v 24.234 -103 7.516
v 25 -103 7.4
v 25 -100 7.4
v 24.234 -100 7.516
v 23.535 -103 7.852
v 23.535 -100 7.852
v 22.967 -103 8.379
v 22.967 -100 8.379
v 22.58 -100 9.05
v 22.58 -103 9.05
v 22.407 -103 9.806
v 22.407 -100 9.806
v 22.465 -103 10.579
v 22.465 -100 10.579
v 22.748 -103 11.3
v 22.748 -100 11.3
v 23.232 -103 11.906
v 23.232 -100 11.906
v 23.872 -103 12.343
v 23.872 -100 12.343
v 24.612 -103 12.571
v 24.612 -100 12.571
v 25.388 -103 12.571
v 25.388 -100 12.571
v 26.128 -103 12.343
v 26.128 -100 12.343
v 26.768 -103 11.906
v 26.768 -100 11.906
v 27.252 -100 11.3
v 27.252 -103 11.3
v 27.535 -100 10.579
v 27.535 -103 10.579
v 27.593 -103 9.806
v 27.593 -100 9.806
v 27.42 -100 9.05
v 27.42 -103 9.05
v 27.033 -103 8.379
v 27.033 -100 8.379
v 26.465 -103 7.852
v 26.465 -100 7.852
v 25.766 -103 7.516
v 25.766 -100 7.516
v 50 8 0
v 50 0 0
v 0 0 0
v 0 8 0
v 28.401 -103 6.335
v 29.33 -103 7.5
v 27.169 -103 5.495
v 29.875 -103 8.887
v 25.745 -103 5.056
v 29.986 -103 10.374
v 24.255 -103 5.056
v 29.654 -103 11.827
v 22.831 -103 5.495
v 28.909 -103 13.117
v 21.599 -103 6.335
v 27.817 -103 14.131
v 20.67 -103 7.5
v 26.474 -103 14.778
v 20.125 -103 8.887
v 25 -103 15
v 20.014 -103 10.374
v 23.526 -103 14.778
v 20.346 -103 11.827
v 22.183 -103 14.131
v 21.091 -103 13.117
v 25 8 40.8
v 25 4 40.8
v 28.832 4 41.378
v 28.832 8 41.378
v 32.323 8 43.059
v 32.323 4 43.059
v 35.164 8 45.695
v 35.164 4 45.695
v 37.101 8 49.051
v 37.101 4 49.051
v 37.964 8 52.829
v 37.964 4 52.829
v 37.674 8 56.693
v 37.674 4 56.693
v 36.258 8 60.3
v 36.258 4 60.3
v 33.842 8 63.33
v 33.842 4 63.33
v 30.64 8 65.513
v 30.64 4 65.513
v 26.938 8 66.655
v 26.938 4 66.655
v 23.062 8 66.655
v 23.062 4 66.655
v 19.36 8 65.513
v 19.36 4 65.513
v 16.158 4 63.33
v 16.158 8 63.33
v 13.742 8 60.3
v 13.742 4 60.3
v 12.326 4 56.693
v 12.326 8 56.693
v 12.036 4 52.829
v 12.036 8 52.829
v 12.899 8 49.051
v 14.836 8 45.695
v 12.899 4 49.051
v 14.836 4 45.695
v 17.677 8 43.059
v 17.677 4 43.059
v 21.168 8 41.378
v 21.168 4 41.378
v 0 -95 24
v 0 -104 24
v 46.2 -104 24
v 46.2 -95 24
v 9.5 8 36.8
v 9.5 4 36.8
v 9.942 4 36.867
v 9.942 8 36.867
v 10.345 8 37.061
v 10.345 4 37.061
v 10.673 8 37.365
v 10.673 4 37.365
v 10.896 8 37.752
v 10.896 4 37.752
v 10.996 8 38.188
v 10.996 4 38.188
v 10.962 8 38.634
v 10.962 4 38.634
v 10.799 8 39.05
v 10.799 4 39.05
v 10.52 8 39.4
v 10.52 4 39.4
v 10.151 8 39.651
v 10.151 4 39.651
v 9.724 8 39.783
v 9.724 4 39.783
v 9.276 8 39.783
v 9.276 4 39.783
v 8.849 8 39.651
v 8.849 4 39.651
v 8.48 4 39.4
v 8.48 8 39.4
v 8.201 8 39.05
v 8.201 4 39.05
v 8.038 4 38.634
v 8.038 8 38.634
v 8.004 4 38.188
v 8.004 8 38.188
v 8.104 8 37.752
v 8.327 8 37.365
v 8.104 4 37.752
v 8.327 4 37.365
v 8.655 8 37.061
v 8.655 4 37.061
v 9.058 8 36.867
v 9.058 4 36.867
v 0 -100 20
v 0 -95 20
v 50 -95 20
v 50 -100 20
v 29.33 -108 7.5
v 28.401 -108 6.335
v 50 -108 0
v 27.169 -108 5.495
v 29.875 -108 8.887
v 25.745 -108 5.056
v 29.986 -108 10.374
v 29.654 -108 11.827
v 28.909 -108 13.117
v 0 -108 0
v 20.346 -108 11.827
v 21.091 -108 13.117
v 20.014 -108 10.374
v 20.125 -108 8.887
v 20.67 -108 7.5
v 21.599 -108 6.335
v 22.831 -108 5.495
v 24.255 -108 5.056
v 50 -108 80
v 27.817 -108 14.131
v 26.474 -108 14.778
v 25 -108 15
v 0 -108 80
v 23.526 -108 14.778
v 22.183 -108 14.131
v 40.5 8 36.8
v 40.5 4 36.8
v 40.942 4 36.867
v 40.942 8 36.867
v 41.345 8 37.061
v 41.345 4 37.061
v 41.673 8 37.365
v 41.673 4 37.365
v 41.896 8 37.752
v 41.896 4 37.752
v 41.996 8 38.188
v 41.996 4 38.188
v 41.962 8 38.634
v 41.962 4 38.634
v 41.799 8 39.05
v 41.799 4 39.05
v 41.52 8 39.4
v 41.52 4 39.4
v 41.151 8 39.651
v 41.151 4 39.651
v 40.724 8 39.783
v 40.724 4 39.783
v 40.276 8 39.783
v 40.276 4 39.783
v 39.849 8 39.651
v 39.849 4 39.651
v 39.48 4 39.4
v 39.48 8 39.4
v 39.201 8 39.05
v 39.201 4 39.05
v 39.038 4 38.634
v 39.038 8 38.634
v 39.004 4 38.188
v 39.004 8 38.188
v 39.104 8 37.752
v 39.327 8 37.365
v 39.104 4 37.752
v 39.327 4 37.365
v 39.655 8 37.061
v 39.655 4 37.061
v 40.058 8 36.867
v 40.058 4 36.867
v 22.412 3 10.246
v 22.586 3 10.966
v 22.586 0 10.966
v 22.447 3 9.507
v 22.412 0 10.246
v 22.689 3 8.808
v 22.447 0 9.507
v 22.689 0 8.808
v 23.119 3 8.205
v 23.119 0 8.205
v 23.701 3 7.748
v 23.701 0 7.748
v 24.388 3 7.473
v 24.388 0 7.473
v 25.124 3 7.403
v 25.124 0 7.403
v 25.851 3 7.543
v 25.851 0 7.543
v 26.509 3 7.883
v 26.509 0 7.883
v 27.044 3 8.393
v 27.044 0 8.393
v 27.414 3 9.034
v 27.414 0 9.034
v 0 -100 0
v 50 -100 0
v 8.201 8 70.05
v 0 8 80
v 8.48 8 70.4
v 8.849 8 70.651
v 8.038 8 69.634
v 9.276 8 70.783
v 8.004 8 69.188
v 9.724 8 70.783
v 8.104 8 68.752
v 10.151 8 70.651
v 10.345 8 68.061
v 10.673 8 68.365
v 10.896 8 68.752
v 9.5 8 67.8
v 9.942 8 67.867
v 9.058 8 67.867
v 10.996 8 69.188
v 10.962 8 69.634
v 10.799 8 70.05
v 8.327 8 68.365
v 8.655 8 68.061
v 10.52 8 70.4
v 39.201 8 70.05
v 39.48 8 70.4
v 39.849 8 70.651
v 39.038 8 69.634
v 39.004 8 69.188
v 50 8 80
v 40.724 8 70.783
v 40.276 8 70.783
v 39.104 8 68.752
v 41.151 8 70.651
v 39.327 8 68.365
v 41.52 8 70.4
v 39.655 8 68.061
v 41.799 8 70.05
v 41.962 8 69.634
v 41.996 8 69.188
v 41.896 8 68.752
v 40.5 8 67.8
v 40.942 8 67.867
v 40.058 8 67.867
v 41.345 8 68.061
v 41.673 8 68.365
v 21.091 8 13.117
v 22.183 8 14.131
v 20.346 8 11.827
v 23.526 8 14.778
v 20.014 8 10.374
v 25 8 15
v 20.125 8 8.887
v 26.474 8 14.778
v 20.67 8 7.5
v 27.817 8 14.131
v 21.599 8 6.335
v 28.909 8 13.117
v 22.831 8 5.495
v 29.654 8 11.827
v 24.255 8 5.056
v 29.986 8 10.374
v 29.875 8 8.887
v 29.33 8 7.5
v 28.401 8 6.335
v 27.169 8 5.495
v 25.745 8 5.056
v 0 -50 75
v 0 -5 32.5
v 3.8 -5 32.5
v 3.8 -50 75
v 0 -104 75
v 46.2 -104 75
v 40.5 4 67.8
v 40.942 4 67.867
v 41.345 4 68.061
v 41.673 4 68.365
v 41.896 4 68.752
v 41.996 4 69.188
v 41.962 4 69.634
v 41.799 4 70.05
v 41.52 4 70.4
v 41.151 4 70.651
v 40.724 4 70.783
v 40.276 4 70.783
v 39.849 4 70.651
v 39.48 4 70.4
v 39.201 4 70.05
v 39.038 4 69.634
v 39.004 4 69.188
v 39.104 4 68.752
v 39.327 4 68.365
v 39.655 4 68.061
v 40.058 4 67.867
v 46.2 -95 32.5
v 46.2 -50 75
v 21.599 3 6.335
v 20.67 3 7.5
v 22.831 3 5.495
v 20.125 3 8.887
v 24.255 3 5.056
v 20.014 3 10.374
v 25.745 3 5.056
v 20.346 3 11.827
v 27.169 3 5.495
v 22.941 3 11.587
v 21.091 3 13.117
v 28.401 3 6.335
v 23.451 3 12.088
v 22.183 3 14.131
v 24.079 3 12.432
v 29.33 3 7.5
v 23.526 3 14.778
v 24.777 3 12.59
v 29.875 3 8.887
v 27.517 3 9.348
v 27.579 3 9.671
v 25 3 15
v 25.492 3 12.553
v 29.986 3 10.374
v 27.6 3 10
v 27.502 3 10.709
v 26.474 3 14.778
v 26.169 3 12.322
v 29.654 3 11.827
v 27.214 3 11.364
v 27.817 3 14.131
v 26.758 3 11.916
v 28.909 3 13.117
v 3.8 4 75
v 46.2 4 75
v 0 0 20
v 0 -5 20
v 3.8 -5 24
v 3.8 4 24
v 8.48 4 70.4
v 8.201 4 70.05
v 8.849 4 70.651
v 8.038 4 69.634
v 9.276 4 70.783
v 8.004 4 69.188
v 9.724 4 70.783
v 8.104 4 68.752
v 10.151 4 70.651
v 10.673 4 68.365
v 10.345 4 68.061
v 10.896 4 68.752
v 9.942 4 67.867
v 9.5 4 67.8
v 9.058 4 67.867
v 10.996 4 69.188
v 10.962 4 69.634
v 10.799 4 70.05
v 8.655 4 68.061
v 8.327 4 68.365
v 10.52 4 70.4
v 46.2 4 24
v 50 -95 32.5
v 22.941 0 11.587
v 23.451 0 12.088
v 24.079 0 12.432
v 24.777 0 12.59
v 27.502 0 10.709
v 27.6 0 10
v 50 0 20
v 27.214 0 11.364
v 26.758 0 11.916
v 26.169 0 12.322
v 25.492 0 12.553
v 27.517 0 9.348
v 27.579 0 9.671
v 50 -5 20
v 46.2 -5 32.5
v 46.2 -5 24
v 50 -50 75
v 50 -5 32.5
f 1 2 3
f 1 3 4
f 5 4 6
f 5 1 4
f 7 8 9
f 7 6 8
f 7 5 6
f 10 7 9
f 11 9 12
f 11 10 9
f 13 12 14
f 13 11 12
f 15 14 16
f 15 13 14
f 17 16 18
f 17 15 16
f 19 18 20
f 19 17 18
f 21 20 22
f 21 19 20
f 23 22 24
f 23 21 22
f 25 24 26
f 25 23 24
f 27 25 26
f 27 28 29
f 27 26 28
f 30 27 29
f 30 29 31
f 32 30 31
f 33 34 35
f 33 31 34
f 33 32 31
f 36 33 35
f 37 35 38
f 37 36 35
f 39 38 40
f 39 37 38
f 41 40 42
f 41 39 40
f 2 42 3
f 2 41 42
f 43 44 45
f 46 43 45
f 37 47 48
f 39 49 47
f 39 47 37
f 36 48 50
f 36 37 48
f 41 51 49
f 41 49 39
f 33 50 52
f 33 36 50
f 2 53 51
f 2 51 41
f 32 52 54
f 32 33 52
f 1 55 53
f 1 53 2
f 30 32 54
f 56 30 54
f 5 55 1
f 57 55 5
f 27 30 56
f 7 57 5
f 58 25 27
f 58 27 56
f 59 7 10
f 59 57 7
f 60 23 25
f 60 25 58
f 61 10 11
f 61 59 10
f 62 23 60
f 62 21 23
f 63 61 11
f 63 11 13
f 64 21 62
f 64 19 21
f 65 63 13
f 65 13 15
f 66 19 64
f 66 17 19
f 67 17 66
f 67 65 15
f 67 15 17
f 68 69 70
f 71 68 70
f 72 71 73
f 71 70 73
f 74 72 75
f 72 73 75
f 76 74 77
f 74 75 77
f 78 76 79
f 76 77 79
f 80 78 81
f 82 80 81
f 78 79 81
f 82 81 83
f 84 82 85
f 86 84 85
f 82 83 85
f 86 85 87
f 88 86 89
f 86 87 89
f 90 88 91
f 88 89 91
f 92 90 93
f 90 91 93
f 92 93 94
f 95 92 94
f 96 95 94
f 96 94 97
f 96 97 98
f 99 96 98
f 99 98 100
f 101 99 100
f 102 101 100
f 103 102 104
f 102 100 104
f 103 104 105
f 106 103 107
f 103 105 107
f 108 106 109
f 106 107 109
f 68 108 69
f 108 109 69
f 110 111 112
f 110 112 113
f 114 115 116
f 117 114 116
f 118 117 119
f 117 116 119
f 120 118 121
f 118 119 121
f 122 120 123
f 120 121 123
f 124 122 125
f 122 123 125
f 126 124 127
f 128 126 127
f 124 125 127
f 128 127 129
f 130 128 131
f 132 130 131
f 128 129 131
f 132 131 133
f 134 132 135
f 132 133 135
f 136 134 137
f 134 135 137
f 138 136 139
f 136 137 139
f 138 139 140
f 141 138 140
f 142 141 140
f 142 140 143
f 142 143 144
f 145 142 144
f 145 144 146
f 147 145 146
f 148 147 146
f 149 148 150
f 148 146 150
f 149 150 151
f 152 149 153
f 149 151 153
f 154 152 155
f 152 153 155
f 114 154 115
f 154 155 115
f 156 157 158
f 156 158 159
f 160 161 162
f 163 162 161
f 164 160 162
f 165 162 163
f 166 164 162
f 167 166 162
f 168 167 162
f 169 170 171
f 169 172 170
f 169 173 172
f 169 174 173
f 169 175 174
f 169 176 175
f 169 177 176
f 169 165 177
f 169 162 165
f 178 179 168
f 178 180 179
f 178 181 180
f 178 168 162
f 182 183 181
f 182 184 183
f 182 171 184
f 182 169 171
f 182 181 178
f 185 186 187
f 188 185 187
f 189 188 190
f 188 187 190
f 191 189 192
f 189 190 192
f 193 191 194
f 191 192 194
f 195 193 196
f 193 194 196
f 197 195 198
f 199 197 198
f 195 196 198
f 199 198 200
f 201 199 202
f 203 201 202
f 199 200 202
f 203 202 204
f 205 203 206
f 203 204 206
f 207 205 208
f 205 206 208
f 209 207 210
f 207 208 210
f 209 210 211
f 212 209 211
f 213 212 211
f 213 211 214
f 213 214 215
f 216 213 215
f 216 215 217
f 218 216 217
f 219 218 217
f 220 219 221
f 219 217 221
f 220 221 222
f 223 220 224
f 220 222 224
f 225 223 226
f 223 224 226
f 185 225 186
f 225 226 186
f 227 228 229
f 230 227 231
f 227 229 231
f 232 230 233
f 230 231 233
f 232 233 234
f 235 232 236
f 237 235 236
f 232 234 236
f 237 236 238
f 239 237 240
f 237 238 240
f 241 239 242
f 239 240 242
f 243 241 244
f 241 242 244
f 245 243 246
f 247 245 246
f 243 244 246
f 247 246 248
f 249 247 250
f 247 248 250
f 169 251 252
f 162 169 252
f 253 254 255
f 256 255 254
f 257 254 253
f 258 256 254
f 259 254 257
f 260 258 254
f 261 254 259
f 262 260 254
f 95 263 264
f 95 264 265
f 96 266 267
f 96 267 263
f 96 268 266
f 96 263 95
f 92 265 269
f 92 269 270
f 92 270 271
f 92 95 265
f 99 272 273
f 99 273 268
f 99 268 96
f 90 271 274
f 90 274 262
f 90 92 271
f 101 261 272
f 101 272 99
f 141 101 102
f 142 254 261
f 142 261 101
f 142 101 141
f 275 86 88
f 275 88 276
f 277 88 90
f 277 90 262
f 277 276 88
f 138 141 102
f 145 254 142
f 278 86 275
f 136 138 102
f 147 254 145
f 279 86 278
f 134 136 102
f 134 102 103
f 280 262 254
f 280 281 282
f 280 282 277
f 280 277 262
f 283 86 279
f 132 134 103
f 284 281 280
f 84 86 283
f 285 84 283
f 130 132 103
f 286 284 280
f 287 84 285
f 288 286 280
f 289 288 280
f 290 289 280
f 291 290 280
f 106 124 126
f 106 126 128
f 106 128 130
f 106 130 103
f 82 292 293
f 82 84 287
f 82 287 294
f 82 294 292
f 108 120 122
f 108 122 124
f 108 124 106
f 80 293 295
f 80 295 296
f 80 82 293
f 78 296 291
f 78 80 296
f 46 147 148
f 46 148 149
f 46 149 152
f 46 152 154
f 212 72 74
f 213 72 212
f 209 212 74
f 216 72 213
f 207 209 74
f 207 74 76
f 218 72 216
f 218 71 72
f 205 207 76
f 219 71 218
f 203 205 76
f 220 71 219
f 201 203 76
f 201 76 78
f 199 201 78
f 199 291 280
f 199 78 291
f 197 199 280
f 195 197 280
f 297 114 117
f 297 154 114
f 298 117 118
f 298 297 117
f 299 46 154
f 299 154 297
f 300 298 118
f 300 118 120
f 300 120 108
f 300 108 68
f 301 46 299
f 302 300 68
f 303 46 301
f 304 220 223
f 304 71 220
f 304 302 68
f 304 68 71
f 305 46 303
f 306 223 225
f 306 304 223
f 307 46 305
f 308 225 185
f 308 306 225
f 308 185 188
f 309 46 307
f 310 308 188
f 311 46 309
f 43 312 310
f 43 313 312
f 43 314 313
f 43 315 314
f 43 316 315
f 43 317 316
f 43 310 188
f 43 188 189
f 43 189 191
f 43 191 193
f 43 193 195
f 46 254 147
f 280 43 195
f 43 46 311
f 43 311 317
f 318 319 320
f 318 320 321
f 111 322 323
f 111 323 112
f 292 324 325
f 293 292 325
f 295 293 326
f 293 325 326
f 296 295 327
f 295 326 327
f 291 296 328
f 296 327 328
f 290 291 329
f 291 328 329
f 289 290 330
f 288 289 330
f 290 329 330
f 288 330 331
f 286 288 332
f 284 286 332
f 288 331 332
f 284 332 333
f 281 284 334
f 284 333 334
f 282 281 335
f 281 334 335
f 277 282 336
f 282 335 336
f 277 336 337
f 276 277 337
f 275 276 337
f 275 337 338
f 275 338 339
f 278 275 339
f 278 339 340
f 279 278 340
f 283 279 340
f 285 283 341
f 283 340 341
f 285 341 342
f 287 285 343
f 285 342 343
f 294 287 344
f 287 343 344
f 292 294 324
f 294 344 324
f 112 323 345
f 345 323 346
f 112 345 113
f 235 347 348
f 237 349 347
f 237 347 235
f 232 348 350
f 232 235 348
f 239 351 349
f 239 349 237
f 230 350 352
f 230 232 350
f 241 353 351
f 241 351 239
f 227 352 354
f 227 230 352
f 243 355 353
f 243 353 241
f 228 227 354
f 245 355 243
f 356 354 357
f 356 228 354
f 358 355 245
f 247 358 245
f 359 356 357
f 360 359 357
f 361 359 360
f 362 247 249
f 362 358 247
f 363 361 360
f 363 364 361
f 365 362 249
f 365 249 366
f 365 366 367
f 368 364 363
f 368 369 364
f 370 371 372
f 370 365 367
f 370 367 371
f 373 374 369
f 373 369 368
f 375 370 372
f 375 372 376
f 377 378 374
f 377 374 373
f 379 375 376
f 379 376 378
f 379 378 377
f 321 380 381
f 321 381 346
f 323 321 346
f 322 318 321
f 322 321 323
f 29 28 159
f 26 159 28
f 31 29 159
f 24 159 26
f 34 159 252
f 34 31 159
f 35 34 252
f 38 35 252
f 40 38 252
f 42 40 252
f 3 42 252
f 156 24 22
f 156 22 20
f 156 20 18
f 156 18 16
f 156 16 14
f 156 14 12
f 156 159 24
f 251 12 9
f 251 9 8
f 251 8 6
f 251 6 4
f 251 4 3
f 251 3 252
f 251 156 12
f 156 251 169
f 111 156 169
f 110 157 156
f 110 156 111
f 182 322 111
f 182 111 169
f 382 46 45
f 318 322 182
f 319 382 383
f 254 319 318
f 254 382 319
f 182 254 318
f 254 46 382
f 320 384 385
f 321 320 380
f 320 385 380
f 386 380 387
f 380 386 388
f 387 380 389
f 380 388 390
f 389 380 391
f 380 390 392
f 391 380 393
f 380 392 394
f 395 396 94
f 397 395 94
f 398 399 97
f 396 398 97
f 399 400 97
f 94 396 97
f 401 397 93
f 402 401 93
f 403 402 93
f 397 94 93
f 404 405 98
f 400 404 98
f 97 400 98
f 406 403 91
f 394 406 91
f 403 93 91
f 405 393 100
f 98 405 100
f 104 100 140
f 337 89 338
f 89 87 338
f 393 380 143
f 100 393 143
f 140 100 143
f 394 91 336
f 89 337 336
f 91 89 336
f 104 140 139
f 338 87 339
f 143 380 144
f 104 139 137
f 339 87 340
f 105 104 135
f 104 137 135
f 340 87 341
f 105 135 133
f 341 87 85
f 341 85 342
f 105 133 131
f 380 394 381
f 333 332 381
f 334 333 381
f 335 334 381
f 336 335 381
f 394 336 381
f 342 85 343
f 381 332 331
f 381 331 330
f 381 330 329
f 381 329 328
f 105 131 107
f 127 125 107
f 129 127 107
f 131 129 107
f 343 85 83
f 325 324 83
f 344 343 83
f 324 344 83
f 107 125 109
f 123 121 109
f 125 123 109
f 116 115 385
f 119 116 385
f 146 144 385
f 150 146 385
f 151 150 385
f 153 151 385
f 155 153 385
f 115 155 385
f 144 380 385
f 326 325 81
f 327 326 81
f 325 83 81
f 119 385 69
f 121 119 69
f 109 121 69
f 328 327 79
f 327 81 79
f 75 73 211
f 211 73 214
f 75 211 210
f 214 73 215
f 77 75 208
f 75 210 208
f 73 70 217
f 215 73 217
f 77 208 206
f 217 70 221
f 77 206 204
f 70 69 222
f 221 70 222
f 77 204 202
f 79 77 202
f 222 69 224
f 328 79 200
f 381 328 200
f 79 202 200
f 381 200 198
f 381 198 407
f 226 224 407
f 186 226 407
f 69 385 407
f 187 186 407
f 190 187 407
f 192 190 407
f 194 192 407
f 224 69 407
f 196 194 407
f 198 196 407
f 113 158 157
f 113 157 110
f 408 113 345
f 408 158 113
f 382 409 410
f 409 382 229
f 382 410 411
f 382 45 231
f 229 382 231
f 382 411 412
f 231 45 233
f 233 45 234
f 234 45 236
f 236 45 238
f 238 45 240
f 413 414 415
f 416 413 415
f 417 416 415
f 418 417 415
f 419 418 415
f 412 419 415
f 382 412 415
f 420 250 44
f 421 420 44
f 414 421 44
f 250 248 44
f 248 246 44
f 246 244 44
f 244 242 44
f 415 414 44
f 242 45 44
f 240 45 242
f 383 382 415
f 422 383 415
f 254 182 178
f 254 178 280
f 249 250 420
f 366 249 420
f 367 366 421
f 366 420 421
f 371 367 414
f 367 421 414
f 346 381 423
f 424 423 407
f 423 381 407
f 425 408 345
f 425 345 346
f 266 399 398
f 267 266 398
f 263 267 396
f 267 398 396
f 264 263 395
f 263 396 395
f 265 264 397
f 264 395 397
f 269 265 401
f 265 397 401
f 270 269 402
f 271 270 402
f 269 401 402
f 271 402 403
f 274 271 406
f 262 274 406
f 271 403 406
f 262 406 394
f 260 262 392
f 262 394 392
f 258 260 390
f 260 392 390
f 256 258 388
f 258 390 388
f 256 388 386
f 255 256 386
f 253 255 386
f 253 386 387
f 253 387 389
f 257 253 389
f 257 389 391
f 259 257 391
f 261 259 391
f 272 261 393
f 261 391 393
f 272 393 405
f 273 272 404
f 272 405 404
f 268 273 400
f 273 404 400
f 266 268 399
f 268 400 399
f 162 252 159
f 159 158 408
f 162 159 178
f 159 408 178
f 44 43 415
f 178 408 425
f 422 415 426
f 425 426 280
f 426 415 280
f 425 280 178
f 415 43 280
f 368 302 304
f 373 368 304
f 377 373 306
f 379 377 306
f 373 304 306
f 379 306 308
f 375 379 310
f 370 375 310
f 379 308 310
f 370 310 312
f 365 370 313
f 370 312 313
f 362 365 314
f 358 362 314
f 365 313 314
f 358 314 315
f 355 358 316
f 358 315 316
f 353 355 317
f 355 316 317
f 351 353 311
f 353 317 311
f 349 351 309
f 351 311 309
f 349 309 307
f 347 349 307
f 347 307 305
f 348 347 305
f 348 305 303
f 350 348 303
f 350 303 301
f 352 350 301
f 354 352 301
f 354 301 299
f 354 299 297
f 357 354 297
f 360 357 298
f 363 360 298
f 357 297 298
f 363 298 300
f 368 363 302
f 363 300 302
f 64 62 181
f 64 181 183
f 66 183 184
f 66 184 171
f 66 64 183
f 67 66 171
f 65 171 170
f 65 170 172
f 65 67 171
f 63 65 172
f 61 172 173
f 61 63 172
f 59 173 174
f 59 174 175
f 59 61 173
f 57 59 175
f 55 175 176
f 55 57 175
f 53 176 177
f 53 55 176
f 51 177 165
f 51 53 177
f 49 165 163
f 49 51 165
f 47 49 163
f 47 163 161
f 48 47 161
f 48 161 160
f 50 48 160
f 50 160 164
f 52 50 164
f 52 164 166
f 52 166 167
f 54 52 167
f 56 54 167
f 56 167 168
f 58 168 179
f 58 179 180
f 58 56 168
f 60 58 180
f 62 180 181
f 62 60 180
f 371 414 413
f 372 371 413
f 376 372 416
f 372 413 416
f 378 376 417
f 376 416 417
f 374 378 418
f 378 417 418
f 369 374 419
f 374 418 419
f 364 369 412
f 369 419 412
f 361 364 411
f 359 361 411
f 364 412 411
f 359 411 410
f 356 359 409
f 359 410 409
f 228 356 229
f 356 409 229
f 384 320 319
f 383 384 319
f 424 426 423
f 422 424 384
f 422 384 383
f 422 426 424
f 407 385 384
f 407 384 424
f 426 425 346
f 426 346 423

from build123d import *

# Parameters (mm, degrees)
SKETCH_1_W          = 50
SKETCH_1_H          = 20
EXTRUDE_1_DEPTH     = 8
SKETCH_2_W          = 50
SKETCH_2_H          = 4
EXTRUDE_2_DEPTH     = 13
SKETCH_3_W          = 50
SKETCH_3_H          = 60
EXTRUDE_3_DEPTH     = 4
SKETCH_4_W          = 50
SKETCH_4_H          = 5
EXTRUDE_4_DEPTH     = 40
EXTRUDE_5_DEPTH     = 50
SKETCH_7_W          = 4
SKETCH_7_H          = 5
CUT_EXTRUDE_1_DEPTH = 50
EXTRUDE_7_DEPTH     = 3.8
EXTRUDE_8_DEPTH     = 3.8
SKETCH_11_R         = 1.5
SKETCH_11_R_2       = 13
CUT_EXTRUDE_2_DEPTH = 4
SKETCH_14_W         = 4
SKETCH_14_H         = 5
EXTRUDE_9_DEPTH     = 50
CUT_EXTRUDE_3_DEPTH = 50
CUT_EXTRUDE_START   = -200
SKETCH_16_R         = 2.6
CUT_EXTRUDE_4_DEPTH = 200
SKETCH_17_R         = 5
CUT_EXTRUDE_5_DEPTH = 5
CUT_EXTRUDE_START_2 = -5
SKETCH_18_R         = 5
CUT_EXTRUDE_6_DEPTH = 5
SKETCH_19_W         = 50
SKETCH_19_H         = 4
CUT_EXTRUDE_7_DEPTH = 20
SKETCH_20_W         = 50
SKETCH_20_H         = 4
CUT_EXTRUDE_8_DEPTH = 20


with BuildPart() as part:
    # 草图1 → 凸台-拉伸1 (new body)
    with BuildSketch(Plane(origin=(0, 0, 0), x_dir=(1, 0, 0), z_dir=(0, 1, 0))):
        with Locations((25, -10)):
            Rectangle(SKETCH_1_W, SKETCH_1_H)
    extrude(amount=EXTRUDE_1_DEPTH)

    # 草图2 → 凸台-拉伸2 (add)
    with BuildSketch(Plane(origin=(0, 8, 0), x_dir=(1, 0, 0), z_dir=(0, 1, 0))):
        with Locations((25, 2)):
            Rectangle(SKETCH_2_W, SKETCH_2_H)
        with Locations((25, -22)):
            Rectangle(SKETCH_2_W, SKETCH_2_H)
    extrude(amount=-EXTRUDE_2_DEPTH)

    # 草图3 → 凸台-拉伸3 (add)
    with BuildSketch(Plane(origin=(0, 8, 0), x_dir=(1, 0, 0), z_dir=(0, 1, 0))):
        with Locations((25, -50)):
            Rectangle(SKETCH_3_W, SKETCH_3_H)
    extrude(amount=-EXTRUDE_3_DEPTH)

    # 草图4 → 凸台-拉伸4 (add)
    with BuildSketch(Plane.XZ.offset(-4)):
        with Locations((25, 77.5)):
            Rectangle(SKETCH_4_W, SKETCH_4_H)
    extrude(amount=EXTRUDE_4_DEPTH)

    # 草图6 → 凸台-拉伸5 (add)
    with BuildSketch(Plane.ZY):
        Polygon((20, -100), (-4, -100), (-4, -108), (80, -108), (80, -36), (75, -36), (75, -104), (24, -104), (24, -95), (20, -95), align=None)
    extrude(amount=-EXTRUDE_5_DEPTH)

    # 草图7 → 切除-拉伸1 (cut)
    with BuildSketch(Plane.ZY):
        with Locations((-2, -2.5)):
            Rectangle(SKETCH_7_W, SKETCH_7_H)
    extrude(amount=-CUT_EXTRUDE_1_DEPTH, mode=Mode.SUBTRACT)

    # 草图8 → 凸台-拉伸7 (add)
    with BuildSketch(Plane.ZY):
        Polygon((75, -50), (75, 4), (24, 4), (24, -5), (32.5, -5), align=None)
    extrude(amount=-EXTRUDE_7_DEPTH)

    # 草图9 → 凸台-拉伸8 (add)
    with BuildSketch(Plane(origin=(50, 0, 0), x_dir=(0, 0, -1), z_dir=(1, 0, 0))):
        Polygon((-24, -5), (-24, 4), (-75, 4), (-75, -50), (-32.5, -5), align=None)
        Polygon((-32.5, -95), (-75, -50), (-75, -104), (-24, -104), (-24, -95), align=None)
    extrude(amount=-EXTRUDE_8_DEPTH)

    # 草图11 → 切除-拉伸2 (cut)
    with BuildSketch(Plane(origin=(0, 4, 0), x_dir=(-1, 0, 0), z_dir=(0, -1, 0))):
        with Locations(Location((-40.5, -38.3, 0), (0, 0, 90))):
            Circle(SKETCH_11_R)
        with Locations(Location((-9.5, -38.3, 0), (0, 0, 90))):
            Circle(SKETCH_11_R)
        with Locations(Location((-40.5, -69.3, 0), (0, 0, 90))):
            Circle(SKETCH_11_R)
        with Locations(Location((-9.5, -69.3, 0), (0, 0, 90))):
            Circle(SKETCH_11_R)
        with Locations(Location((-25, -53.8, 0), (0, 0, 90))):
            Circle(SKETCH_11_R_2)
    extrude(amount=-CUT_EXTRUDE_2_DEPTH, mode=Mode.SUBTRACT)

    # 草图14 → 凸台-拉伸9 (add)
    with BuildSketch(Plane.ZY):
        with Locations((-2, -97.5)):
            Rectangle(SKETCH_14_W, SKETCH_14_H)
        with Locations((-2, -2.5)):
            Rectangle(SKETCH_14_W, SKETCH_14_H)
    extrude(amount=-EXTRUDE_9_DEPTH)

    # 草图15 → 切除-拉伸3 (cut)
    with BuildSketch(Plane.XZ):
        with BuildLine():
            ThreePointArc((27.6, 10), (25.491679555, 12.553086606), (22.585960604, 10.965615759))
            Line((22.585960604, 10.965615759), (27.414039396, 9.034384241))
            ThreePointArc((27.414039396, 9.034384241), (27.553086606, 9.508320445), (27.6, 10))
        make_face()
        with BuildLine():
            Line((27.414039396, 9.034384241), (22.585960604, 10.965615759))
            ThreePointArc((22.585960604, 10.965615759), (24.034384241, 7.585960604), (27.414039396, 9.034384241))
        make_face()
    extrude(amount=-CUT_EXTRUDE_3_DEPTH, mode=Mode.SUBTRACT)

    # 草图16 → 切除-拉伸4 (cut)
    with BuildSketch(Plane(origin=(0, 8, 0), x_dir=(1, 0, 0), z_dir=(0, 1, 0)).offset(CUT_EXTRUDE_START)):
        with Locations(Location((25, -10, 0), (0, 0, 90))):
            Circle(SKETCH_16_R)
    extrude(amount=CUT_EXTRUDE_4_DEPTH, mode=Mode.SUBTRACT)

    # 草图17 → 切除-拉伸5 (cut)
    with BuildSketch(Plane(origin=(0, 8, 0), x_dir=(1, 0, 0), z_dir=(0, 1, 0))):
        with Locations(Location((25, -10, 0), (0, 0, 270))):
            Circle(SKETCH_17_R)
    extrude(amount=-CUT_EXTRUDE_5_DEPTH, mode=Mode.SUBTRACT)

    # 草图18 → 切除-拉伸6 (cut)
    with BuildSketch(Plane.XZ.offset(108).offset(CUT_EXTRUDE_START_2)):
        with Locations(Location((25, 10, 0), (0, 0, 90))):
            Circle(SKETCH_18_R)
    extrude(amount=CUT_EXTRUDE_6_DEPTH, mode=Mode.SUBTRACT)

    # 草图19 → 切除-拉伸7 (cut)
    with BuildSketch(Plane(origin=(0, -5, 0), x_dir=(-1, 0, 0), z_dir=(0, -1, 0))):
        with Locations((-25, 2)):
            Rectangle(SKETCH_19_W, SKETCH_19_H)
    extrude(amount=-CUT_EXTRUDE_7_DEPTH, mode=Mode.SUBTRACT)

    # 草图20 → 切除-拉伸8 (cut)
    with BuildSketch(Plane(origin=(0, -95, 0), x_dir=(1, 0, 0), z_dir=(0, 1, 0))):
        with Locations((25, 2)):
            Rectangle(SKETCH_20_W, SKETCH_20_H)
    extrude(amount=-CUT_EXTRUDE_8_DEPTH, mode=Mode.SUBTRACT)


solid = part.part
